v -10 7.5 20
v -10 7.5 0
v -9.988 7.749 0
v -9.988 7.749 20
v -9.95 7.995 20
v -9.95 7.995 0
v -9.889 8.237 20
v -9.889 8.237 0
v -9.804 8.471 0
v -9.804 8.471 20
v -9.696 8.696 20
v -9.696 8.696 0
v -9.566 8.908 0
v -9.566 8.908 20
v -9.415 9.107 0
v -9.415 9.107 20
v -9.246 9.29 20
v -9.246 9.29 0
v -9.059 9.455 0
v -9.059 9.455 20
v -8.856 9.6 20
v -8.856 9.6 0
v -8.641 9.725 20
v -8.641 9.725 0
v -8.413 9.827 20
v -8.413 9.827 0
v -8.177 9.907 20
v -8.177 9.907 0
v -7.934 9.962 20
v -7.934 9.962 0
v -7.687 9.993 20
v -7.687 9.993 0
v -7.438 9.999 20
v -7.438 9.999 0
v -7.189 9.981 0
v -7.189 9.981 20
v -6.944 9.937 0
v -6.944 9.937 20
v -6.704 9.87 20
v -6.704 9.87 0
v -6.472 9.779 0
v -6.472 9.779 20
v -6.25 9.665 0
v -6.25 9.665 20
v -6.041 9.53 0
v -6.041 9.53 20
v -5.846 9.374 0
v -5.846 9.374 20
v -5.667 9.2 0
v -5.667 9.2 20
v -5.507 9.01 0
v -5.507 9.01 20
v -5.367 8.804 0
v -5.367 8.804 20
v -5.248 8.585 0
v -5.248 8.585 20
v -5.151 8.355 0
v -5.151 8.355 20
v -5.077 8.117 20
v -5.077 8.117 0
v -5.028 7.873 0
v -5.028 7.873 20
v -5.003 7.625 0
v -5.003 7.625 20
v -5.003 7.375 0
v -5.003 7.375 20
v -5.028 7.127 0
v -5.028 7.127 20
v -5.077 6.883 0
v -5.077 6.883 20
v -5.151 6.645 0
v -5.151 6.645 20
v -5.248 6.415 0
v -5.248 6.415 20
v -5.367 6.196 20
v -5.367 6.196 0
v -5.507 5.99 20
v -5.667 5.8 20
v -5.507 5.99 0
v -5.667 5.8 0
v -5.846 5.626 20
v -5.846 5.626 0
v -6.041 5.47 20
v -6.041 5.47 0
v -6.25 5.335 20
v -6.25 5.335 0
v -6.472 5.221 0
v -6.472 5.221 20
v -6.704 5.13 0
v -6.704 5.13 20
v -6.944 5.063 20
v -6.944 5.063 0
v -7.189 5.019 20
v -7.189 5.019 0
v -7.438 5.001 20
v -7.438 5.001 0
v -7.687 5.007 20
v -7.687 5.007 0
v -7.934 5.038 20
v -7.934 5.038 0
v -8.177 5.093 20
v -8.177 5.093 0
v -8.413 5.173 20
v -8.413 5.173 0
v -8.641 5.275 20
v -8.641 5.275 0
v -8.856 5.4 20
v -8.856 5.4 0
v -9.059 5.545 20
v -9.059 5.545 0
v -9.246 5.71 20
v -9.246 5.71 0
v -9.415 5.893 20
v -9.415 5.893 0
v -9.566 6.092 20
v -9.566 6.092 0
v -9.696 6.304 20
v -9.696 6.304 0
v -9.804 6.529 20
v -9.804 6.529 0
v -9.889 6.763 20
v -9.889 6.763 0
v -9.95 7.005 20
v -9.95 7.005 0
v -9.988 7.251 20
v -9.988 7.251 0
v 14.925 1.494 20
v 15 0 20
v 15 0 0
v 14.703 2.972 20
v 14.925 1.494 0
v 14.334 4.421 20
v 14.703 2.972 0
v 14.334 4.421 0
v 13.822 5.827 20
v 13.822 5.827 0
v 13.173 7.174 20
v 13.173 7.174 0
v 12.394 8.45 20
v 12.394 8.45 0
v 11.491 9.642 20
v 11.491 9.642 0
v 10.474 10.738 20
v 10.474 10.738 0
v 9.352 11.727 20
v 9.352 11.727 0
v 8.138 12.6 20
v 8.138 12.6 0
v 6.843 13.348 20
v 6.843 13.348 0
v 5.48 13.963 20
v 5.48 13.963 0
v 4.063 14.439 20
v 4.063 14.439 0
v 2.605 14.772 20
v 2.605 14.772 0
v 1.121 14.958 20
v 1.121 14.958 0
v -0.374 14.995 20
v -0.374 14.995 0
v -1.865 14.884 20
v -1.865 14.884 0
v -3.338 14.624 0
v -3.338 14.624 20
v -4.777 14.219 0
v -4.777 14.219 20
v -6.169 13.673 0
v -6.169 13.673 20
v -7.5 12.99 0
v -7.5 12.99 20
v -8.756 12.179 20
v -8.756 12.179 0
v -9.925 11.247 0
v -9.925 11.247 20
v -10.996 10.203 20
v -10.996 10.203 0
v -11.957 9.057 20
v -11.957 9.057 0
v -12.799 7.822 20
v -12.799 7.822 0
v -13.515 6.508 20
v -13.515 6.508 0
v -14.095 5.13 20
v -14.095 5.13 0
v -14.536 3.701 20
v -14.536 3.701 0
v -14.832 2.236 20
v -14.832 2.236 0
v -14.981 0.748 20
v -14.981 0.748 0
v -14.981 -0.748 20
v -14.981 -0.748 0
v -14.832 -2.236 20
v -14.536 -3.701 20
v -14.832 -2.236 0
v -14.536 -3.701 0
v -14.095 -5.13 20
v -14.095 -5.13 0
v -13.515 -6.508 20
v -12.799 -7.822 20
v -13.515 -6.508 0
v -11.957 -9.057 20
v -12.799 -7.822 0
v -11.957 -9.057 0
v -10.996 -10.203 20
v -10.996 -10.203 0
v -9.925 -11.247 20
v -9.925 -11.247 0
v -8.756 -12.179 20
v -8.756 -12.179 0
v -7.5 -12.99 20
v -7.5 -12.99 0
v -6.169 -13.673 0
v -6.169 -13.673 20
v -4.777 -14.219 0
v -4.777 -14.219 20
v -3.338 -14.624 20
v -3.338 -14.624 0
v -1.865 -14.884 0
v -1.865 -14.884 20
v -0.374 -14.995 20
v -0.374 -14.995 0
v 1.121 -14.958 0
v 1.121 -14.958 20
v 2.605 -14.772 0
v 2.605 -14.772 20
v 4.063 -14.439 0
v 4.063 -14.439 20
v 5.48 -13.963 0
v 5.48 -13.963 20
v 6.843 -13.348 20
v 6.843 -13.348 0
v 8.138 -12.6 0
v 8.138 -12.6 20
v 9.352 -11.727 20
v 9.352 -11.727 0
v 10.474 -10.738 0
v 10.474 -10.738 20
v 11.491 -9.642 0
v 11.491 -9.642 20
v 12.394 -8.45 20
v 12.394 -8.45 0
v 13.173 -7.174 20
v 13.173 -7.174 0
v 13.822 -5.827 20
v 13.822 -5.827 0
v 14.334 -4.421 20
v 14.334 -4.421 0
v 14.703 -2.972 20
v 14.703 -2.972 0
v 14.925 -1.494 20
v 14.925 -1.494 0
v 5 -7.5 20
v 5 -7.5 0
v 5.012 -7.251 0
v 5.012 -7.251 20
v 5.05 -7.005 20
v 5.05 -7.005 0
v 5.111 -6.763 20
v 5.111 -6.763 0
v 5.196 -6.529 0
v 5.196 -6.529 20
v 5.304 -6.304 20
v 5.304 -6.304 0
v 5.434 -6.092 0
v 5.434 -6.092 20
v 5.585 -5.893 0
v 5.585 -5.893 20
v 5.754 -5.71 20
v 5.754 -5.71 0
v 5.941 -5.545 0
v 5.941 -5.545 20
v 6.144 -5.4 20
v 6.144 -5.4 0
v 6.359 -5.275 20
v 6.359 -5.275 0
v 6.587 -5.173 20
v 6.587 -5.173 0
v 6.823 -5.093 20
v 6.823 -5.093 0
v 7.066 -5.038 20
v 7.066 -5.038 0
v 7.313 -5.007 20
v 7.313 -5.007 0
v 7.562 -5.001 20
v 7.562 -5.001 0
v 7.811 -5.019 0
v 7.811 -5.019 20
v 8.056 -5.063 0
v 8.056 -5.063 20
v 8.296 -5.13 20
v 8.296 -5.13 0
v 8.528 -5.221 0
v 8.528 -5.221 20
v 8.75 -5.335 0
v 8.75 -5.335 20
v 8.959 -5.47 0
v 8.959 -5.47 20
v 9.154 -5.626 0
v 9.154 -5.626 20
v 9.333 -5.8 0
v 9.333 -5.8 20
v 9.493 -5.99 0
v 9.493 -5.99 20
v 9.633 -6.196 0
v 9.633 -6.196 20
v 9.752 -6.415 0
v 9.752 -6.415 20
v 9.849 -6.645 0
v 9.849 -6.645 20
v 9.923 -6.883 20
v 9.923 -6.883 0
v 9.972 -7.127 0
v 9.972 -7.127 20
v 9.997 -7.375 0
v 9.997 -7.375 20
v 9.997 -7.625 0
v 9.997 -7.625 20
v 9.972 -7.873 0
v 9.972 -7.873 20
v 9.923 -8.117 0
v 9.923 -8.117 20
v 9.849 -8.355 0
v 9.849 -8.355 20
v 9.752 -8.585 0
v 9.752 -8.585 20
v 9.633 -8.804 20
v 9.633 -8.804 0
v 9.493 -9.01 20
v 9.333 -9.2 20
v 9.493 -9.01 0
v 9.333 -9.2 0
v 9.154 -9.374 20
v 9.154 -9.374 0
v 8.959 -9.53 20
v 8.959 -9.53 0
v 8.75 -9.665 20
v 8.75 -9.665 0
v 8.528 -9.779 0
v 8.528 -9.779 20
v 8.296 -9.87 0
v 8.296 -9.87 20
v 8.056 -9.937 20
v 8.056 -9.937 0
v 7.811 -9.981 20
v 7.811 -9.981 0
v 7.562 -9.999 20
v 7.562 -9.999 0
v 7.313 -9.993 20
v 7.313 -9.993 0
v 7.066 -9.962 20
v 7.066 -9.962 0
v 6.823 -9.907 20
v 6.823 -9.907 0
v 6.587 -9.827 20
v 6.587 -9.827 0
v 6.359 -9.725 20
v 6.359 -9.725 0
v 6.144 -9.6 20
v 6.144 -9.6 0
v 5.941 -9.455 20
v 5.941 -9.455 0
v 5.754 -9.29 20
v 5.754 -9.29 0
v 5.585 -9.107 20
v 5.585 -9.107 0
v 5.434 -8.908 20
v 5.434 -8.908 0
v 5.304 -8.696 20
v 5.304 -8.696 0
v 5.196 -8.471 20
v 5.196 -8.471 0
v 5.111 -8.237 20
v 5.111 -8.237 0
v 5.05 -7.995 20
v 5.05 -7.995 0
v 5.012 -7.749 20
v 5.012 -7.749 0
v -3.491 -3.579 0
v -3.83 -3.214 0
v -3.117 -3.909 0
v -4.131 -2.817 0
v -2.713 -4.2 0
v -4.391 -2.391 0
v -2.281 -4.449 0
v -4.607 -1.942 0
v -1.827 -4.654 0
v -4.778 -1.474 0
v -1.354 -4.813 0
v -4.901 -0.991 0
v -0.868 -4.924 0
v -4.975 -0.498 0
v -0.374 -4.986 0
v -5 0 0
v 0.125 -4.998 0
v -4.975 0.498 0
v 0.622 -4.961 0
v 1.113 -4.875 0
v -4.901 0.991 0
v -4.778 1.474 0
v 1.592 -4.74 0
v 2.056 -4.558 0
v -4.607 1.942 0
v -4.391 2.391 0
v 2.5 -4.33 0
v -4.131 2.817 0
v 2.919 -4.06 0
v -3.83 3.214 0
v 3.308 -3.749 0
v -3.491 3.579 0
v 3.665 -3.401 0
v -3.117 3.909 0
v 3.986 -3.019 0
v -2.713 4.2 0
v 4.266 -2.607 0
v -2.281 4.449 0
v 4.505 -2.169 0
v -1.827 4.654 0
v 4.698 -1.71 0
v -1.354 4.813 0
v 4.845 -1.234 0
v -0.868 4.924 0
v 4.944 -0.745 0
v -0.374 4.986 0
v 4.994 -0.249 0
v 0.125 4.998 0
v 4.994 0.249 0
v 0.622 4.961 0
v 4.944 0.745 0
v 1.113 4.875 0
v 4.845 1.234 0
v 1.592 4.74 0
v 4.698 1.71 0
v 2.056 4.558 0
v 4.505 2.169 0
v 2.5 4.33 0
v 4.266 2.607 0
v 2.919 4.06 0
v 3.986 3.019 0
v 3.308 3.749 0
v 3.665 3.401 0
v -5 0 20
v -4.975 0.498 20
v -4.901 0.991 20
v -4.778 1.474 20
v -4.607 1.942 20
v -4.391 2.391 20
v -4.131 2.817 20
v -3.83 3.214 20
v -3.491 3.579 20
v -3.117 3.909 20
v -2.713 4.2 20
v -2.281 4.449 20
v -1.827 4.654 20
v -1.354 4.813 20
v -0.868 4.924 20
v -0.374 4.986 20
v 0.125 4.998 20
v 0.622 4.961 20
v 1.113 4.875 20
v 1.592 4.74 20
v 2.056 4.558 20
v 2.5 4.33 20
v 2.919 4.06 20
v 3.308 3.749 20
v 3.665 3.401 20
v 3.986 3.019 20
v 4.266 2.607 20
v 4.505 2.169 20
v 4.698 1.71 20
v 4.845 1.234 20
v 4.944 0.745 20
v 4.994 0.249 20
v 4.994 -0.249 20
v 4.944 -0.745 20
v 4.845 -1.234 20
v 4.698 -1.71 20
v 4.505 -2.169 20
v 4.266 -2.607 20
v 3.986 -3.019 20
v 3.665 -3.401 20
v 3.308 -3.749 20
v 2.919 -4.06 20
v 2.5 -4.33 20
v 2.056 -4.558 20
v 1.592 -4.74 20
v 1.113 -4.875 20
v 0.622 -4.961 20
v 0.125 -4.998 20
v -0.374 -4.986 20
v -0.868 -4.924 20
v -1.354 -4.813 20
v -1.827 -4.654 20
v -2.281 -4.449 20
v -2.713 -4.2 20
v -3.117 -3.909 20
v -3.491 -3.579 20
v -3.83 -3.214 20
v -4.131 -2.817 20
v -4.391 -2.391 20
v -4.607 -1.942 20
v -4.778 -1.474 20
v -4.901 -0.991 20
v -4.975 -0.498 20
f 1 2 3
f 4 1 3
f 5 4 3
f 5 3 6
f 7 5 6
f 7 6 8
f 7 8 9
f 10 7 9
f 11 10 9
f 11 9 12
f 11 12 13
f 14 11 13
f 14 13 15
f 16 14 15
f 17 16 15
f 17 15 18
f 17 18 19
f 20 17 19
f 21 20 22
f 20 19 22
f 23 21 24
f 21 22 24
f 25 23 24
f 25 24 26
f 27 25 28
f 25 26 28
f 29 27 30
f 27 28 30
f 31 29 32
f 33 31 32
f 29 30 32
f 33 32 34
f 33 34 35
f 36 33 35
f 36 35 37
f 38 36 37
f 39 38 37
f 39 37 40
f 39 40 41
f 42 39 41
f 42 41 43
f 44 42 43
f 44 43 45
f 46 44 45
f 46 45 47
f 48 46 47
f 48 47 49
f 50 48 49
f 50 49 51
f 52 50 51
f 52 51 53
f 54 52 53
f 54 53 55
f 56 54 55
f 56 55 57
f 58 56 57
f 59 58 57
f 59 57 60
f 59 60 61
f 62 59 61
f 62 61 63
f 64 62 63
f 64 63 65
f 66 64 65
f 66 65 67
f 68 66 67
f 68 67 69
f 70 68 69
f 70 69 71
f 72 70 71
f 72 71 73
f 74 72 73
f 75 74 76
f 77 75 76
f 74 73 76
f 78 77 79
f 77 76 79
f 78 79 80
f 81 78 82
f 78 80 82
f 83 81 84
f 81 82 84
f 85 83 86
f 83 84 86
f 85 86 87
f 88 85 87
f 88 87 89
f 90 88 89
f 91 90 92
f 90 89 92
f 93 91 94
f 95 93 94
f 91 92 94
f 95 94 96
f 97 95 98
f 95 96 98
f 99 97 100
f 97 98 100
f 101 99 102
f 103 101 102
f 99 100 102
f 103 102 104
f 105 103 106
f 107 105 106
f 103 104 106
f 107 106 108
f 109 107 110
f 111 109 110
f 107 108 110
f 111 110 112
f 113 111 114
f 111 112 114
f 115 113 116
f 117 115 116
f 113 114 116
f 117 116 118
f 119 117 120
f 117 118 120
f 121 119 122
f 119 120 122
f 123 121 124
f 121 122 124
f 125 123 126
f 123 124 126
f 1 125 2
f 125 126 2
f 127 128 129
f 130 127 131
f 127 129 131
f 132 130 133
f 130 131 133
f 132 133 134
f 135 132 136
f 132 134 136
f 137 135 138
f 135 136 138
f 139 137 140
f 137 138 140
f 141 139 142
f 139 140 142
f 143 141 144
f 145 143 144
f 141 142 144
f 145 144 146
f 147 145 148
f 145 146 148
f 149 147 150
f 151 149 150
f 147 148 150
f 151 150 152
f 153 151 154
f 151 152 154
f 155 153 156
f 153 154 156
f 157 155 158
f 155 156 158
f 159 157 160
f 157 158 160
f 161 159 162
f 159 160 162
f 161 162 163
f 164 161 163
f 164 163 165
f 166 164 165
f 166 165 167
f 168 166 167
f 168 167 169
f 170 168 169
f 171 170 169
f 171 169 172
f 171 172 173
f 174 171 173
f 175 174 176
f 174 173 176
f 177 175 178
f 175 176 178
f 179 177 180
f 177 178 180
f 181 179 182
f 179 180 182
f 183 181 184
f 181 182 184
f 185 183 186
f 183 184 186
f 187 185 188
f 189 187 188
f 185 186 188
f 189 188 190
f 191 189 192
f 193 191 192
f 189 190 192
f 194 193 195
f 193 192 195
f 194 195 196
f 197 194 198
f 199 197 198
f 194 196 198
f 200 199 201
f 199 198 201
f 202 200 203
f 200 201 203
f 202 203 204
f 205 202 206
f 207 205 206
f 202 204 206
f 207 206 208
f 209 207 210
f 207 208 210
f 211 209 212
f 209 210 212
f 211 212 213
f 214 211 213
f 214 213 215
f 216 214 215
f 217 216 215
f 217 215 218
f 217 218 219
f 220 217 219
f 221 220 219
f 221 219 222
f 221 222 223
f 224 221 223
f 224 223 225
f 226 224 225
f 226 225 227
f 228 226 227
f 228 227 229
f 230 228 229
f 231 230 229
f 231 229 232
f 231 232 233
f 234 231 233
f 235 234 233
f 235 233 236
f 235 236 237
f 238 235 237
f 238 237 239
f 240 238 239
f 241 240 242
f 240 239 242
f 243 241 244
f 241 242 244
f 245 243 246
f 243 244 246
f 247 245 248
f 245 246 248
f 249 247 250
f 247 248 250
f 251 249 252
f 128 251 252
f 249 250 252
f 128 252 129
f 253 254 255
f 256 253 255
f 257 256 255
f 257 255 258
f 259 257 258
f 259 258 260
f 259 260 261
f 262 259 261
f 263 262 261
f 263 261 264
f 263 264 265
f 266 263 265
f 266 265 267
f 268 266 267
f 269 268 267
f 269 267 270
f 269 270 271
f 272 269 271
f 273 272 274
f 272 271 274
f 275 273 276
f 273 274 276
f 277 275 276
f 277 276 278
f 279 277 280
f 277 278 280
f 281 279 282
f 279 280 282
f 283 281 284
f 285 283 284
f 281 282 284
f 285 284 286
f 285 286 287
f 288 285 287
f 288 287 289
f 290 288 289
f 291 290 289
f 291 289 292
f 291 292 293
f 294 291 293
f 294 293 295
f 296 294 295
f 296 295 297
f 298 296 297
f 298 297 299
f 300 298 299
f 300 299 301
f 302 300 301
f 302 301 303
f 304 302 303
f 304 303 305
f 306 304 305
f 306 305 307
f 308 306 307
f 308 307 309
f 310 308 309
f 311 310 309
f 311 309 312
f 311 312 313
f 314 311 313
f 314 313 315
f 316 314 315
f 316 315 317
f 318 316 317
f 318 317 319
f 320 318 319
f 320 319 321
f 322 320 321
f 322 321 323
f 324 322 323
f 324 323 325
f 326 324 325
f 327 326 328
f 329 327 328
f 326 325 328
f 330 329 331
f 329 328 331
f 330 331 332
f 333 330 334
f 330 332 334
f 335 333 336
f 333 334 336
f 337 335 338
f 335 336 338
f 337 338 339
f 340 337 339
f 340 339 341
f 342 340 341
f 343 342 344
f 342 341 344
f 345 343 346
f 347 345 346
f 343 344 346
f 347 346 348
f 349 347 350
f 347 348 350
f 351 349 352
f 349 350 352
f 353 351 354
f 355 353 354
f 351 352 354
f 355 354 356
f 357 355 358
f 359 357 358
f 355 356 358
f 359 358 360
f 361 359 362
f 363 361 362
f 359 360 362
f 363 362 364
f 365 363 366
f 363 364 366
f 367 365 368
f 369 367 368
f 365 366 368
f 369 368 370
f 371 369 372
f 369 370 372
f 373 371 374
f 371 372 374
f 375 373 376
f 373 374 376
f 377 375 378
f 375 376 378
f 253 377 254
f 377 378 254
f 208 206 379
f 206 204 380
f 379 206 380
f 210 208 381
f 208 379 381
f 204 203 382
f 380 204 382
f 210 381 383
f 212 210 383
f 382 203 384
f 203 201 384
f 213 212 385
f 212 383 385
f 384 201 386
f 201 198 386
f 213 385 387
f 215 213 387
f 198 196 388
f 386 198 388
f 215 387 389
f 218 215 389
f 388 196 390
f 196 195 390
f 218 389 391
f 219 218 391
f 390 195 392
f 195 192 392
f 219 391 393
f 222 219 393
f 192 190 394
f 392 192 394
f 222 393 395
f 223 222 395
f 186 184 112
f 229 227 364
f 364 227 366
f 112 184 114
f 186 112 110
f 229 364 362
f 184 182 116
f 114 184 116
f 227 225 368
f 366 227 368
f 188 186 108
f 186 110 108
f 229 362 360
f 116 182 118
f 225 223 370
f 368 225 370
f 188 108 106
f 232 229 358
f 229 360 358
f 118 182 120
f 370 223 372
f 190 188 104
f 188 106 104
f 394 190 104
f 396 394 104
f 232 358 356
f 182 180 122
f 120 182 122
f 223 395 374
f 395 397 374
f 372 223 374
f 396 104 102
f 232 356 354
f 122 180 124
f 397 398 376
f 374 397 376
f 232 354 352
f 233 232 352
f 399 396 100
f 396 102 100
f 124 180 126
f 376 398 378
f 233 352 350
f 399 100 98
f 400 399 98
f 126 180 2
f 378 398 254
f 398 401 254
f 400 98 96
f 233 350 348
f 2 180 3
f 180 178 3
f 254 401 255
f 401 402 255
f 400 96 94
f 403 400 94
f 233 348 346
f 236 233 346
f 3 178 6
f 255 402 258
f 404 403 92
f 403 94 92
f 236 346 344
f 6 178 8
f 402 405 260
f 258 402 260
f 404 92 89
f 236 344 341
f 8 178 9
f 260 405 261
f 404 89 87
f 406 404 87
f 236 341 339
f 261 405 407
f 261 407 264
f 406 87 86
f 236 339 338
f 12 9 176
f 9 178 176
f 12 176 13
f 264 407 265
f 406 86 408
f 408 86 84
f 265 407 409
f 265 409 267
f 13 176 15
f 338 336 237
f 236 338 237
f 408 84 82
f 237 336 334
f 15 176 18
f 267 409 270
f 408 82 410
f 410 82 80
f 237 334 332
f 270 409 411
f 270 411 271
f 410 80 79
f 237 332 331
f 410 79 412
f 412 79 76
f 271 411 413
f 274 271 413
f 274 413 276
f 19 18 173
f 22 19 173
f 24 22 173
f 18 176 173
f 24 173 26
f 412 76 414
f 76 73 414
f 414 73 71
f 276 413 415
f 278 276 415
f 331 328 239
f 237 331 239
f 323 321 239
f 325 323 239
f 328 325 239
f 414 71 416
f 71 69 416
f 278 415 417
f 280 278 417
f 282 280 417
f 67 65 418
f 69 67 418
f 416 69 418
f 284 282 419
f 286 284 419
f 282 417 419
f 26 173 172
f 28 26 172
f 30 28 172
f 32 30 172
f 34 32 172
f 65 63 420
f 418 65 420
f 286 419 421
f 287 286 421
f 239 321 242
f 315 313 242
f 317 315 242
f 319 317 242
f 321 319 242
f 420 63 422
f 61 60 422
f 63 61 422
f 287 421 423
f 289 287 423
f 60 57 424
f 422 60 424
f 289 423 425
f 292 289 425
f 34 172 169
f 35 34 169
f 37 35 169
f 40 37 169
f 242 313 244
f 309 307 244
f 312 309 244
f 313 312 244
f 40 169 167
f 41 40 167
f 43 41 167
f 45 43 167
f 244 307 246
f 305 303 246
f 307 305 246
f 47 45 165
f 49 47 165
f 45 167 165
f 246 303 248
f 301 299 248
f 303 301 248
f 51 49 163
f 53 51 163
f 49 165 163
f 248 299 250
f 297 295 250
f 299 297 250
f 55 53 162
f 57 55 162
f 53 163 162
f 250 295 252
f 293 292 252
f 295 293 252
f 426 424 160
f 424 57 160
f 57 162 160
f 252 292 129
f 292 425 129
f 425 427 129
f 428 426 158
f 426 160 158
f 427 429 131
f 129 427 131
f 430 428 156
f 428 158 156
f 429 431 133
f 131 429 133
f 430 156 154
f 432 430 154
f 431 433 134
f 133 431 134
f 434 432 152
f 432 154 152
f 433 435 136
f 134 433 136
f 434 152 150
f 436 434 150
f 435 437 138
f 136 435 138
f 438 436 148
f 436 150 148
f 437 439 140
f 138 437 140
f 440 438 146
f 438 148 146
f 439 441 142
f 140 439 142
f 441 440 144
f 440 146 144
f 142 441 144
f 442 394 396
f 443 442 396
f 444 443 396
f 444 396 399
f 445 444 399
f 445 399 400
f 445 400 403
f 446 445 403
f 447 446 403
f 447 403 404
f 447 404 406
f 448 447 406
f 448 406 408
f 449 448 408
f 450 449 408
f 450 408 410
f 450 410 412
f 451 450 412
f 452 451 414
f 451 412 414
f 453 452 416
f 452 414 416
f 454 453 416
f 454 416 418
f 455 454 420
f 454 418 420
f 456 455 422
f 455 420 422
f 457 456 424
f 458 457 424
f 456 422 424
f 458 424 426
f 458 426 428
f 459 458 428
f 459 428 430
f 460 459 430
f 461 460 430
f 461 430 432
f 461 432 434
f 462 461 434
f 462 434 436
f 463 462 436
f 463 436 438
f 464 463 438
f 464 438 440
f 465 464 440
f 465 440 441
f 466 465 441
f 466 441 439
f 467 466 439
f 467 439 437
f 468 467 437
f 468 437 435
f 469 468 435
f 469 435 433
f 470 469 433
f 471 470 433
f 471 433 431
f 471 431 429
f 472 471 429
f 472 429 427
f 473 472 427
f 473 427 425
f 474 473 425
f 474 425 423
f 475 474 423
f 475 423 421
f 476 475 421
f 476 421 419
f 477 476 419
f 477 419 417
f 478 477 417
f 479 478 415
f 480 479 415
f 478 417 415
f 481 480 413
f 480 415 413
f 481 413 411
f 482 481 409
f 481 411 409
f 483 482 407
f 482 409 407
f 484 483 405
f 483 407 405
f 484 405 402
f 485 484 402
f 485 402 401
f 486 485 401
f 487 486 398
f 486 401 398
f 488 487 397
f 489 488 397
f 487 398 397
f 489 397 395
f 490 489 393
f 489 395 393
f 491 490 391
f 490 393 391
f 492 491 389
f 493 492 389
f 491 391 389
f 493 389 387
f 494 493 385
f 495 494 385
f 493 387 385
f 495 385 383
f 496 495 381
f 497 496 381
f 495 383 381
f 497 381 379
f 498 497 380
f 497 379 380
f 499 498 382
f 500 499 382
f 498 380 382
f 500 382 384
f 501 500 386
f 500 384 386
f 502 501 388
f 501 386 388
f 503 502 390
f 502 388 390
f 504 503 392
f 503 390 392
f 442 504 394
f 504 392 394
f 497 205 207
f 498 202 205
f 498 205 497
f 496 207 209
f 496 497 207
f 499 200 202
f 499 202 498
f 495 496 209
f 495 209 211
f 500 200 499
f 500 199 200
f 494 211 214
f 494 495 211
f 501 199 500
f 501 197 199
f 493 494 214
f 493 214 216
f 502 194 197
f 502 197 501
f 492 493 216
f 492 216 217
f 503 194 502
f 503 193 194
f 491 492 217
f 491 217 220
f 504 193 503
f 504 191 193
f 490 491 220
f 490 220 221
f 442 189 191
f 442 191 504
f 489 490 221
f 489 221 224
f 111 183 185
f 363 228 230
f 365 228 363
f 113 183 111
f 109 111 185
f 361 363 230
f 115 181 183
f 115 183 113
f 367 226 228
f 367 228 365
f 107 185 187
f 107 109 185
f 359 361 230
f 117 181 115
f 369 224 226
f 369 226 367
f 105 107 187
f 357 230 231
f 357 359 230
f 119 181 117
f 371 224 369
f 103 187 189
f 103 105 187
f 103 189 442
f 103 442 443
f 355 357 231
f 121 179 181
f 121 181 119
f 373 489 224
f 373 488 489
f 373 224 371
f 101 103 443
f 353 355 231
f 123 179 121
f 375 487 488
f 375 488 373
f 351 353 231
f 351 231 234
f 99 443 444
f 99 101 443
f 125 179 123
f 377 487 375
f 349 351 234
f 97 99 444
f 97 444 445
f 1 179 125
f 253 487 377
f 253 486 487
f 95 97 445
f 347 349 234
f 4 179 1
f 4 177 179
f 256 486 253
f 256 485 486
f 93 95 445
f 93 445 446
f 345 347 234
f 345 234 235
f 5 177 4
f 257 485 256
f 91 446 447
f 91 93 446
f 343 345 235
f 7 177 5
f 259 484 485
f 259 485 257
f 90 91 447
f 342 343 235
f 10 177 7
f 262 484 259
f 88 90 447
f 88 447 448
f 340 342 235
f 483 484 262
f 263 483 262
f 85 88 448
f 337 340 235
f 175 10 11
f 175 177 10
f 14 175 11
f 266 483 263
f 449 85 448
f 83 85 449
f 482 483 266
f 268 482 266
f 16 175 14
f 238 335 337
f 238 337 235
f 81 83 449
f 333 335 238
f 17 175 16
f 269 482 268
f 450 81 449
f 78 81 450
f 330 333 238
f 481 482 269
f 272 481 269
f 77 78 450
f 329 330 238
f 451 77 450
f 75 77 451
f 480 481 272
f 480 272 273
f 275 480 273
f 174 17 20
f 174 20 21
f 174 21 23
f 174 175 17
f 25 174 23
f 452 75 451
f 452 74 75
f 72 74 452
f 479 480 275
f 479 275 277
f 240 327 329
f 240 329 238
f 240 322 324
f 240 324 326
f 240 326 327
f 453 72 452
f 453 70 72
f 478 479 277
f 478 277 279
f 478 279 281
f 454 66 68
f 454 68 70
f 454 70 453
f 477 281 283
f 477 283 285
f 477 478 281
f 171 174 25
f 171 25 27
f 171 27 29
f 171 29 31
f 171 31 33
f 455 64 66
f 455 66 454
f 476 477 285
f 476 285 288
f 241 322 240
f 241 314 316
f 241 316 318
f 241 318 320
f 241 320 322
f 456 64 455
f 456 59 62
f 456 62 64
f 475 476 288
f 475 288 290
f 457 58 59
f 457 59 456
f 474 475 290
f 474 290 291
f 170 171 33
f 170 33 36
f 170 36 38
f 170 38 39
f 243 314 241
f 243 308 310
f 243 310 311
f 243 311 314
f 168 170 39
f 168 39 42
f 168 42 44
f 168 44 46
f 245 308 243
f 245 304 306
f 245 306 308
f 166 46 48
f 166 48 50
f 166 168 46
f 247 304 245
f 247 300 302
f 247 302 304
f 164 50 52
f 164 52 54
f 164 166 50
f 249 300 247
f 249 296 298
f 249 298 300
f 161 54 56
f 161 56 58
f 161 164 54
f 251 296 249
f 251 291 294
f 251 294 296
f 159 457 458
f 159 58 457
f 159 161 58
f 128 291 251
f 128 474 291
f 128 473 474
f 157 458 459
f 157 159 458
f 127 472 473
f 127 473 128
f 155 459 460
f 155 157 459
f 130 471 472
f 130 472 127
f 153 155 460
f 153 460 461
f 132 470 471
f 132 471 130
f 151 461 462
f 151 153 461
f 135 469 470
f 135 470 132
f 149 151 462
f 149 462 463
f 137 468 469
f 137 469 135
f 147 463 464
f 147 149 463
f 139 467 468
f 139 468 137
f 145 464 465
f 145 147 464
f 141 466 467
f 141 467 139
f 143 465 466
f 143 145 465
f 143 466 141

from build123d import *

# Parameters (mm, degrees)
SKIZZE2_R                        = 15
AUFSATZ_LINEAR_AUSTRAGEN1_DEPTH  = 20
F_10_0_10_DURCHMESSER_BOHRUNG1_D = 10
F_5_0_5_DURCHMESSER_BOHRUNG1_D   = 5


with BuildPart() as part:
    # Skizze2 → Aufsatz-Linear austragen1 (new body)
    with BuildSketch(Plane.XY):
        Circle(SKIZZE2_R)
    extrude(amount=AUFSATZ_LINEAR_AUSTRAGEN1_DEPTH)

    # Ø10.0 (10) Durchmesser Bohrung1 (through all)
    with Locations(Plane.XY.offset(20)):
        with Locations((0, 0)):
            Hole(F_10_0_10_DURCHMESSER_BOHRUNG1_D / 2)

    # Ø5.0 (5) Durchmesser Bohrung1 (through all)
    with Locations(Plane.XY.offset(20)):
        with Locations((-7.5, 7.5), (7.5, -7.5)):
            Hole(F_5_0_5_DURCHMESSER_BOHRUNG1_D / 2)


solid = part.part
